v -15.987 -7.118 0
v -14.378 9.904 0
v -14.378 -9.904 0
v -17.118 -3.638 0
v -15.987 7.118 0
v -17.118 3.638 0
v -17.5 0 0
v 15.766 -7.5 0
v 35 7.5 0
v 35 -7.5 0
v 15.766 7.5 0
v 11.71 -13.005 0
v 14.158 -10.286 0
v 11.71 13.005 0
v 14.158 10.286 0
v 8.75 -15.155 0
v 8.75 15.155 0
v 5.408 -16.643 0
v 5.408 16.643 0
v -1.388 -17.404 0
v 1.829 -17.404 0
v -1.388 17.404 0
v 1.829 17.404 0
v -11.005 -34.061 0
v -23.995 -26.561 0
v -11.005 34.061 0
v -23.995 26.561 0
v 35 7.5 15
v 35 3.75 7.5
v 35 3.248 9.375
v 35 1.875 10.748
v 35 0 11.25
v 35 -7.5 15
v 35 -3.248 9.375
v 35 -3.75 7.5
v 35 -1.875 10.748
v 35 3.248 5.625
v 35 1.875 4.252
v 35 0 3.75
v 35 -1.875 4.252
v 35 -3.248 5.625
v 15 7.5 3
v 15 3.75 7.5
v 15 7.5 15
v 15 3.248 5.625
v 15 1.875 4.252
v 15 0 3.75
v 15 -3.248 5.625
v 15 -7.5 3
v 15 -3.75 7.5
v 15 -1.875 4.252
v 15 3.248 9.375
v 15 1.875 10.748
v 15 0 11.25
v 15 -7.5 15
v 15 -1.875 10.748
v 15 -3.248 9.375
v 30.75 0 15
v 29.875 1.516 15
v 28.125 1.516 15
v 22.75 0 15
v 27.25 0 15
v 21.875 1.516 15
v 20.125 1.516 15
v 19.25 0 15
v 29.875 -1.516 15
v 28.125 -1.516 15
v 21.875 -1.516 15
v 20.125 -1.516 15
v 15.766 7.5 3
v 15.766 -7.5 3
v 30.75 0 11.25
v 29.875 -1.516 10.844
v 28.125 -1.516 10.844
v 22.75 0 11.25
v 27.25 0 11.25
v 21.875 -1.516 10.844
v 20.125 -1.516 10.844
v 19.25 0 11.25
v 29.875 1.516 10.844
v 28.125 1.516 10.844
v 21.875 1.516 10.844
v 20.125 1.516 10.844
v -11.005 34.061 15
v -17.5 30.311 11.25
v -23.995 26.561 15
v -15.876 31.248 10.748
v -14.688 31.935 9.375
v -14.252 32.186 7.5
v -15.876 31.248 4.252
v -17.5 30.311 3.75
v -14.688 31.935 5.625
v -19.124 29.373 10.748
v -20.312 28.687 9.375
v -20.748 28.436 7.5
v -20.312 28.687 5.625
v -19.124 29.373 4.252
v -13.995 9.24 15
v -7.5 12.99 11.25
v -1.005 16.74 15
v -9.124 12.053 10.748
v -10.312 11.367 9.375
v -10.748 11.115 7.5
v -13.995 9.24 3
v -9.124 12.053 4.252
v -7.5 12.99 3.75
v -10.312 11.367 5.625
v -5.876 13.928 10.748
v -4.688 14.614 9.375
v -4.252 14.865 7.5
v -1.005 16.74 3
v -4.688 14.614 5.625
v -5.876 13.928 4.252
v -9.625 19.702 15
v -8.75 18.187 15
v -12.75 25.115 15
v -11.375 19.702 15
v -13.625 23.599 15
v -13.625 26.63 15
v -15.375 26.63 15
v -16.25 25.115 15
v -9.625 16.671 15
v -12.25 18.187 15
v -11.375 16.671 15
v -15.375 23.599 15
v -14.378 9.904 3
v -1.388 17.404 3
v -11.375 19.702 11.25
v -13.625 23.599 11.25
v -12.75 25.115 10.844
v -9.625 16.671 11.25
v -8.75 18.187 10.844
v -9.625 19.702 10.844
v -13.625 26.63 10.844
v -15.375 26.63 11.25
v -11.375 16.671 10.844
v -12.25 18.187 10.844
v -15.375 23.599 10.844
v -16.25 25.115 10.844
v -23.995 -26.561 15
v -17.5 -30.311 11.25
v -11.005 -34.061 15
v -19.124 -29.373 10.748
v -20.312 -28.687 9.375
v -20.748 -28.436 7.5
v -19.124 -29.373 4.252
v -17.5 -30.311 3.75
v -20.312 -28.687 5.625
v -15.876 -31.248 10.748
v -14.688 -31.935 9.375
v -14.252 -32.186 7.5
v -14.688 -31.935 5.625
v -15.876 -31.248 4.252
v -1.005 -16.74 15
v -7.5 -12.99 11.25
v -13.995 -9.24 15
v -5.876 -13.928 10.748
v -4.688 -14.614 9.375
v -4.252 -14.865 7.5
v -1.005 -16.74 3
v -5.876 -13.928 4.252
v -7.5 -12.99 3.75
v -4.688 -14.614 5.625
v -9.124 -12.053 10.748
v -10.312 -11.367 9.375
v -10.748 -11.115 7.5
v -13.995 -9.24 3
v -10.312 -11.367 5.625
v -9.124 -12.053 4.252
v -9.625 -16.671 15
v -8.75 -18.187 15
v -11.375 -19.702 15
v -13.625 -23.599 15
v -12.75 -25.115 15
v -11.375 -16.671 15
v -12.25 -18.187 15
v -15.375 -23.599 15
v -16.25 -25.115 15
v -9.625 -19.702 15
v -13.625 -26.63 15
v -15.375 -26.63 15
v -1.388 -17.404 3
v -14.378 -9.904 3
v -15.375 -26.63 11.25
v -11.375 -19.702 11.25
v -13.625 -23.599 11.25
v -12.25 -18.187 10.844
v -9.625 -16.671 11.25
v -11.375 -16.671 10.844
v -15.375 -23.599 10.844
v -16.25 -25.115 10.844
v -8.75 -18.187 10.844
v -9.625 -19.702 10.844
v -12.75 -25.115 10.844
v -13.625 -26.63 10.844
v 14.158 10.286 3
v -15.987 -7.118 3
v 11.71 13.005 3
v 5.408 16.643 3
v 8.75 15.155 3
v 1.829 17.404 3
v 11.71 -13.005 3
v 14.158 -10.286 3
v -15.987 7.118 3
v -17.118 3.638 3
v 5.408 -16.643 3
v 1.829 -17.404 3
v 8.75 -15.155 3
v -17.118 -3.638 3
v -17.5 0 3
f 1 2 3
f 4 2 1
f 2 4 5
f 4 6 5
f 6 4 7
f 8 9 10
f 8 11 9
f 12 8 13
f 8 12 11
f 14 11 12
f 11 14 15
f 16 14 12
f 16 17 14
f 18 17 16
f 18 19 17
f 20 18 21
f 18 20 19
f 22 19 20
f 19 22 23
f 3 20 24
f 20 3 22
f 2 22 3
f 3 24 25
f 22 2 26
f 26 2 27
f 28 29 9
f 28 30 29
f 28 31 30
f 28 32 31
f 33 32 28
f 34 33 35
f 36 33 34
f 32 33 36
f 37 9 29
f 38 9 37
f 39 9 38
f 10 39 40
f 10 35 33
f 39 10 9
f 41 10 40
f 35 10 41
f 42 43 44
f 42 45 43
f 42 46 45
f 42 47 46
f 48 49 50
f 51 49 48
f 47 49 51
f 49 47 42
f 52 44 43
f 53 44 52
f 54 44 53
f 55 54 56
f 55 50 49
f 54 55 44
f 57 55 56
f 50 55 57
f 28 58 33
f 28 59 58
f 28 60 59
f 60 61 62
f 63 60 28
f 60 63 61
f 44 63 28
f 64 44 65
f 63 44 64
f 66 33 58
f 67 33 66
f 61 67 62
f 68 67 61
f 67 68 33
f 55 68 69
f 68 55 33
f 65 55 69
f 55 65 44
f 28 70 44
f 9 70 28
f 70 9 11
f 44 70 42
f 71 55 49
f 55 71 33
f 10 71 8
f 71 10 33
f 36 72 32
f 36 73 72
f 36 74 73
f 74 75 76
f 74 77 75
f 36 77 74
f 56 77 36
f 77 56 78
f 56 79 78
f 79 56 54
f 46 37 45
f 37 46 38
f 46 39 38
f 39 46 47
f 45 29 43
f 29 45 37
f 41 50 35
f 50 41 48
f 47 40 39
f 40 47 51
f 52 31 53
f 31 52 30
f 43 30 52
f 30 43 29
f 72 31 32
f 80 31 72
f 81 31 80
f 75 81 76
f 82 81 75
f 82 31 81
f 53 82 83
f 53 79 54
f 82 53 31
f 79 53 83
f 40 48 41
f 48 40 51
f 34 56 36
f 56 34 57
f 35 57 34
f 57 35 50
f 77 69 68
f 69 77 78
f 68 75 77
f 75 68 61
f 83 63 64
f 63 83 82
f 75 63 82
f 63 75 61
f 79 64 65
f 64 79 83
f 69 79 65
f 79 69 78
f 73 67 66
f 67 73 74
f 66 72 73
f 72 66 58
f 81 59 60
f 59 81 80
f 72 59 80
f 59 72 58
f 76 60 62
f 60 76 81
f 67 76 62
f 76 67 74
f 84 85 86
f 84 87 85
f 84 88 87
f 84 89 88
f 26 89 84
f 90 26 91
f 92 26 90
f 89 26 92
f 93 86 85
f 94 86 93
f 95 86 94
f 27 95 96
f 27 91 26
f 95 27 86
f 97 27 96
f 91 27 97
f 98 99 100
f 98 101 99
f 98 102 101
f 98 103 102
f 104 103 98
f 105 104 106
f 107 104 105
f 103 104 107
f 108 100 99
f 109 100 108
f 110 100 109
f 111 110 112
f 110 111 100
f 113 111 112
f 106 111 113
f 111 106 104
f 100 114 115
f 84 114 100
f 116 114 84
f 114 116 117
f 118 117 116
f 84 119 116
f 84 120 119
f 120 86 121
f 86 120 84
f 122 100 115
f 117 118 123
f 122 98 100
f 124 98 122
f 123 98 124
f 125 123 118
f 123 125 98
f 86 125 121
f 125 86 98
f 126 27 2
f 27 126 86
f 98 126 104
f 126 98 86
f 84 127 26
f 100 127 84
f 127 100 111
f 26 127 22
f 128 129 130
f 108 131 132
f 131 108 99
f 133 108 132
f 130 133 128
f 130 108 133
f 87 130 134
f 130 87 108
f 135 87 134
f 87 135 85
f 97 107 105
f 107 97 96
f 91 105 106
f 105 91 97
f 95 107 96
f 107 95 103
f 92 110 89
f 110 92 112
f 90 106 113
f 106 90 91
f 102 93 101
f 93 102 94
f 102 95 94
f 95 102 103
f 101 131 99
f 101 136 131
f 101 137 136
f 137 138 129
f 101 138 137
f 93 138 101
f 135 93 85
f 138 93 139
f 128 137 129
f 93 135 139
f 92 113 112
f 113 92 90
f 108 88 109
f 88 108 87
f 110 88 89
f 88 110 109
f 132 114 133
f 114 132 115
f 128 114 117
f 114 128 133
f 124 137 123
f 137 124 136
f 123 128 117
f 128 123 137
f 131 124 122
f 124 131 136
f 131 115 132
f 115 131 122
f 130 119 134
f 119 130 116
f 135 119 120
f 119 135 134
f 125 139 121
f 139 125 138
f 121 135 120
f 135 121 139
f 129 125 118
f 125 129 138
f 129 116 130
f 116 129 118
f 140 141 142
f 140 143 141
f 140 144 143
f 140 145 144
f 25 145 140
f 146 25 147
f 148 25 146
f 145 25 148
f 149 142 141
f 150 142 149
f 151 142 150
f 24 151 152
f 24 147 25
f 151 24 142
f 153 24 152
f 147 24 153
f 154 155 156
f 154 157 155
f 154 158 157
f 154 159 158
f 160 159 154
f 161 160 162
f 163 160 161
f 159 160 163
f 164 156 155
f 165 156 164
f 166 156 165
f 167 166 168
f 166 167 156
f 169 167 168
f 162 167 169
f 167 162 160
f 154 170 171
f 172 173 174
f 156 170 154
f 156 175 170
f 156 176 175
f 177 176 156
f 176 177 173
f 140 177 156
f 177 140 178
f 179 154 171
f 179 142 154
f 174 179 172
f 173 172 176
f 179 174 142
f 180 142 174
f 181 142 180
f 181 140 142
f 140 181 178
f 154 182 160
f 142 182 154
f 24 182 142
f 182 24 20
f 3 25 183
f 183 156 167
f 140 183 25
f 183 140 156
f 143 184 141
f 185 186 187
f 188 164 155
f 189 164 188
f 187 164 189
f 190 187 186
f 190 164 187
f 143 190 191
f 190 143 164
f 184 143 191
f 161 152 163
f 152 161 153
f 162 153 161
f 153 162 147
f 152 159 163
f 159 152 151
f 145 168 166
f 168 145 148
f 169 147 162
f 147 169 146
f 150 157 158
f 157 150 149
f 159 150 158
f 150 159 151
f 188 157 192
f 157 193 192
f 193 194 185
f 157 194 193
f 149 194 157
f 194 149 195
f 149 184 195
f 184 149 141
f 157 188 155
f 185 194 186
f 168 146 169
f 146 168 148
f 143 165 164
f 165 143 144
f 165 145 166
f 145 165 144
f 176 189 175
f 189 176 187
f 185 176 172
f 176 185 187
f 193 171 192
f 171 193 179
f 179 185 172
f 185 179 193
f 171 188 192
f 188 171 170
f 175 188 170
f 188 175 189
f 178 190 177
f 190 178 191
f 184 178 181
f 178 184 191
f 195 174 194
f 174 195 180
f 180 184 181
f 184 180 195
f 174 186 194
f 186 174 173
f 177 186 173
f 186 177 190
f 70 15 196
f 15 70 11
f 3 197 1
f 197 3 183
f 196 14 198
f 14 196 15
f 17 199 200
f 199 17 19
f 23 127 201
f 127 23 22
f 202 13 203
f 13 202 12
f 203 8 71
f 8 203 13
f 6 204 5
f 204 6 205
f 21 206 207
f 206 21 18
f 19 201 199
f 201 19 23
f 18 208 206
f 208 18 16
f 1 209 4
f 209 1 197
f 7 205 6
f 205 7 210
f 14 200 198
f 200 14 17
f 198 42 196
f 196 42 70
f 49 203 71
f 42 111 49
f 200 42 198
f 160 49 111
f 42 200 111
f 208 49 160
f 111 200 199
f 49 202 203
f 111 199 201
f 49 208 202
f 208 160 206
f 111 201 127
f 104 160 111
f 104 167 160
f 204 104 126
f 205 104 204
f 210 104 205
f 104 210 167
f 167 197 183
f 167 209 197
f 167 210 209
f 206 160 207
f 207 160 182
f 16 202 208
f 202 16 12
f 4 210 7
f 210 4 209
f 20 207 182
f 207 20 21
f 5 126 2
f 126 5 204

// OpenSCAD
union() {
	cylinder(d = 35, h = 3);
	translate(v = [0, 0, 7.5000000000]) {
		translate(v = [25, 0, 0]) {
			difference() {
				rotate(a = [0, 90, 0]) {
					difference() {
						cube(center = true, size = [15, 15, 20]);
						translate(v = [0, 0, -20]) {
							cylinder(d = 7.5000000000, h = 40);
						}
					}
				}
				translate(v = [-4, 0, 0]) {
					cylinder(d = 3.5000000000, h = 10);
				}
				translate(v = [4, 0, 0]) {
					cylinder(d = 3.5000000000, h = 10);
				}
			}
		}
	}
	rotate(a = [0, 0, 120]) {
		translate(v = [0, 0, 7.5000000000]) {
			translate(v = [25, 0, 0]) {
				difference() {
					rotate(a = [0, 90, 0]) {
						difference() {
							cube(center = true, size = [15, 15, 20]);
							translate(v = [0, 0, -20]) {
								cylinder(d = 7.5000000000, h = 40);
							}
						}
					}
					translate(v = [-4, 0, 0]) {
						cylinder(d = 3.5000000000, h = 10);
					}
					translate(v = [4, 0, 0]) {
						cylinder(d = 3.5000000000, h = 10);
					}
				}
			}
		}
	}
	rotate(a = [0, 0, 240]) {
		translate(v = [0, 0, 7.5000000000]) {
			translate(v = [25, 0, 0]) {
				difference() {
					rotate(a = [0, 90, 0]) {
						difference() {
							cube(center = true, size = [15, 15, 20]);
							translate(v = [0, 0, -20]) {
								cylinder(d = 7.5000000000, h = 40);
							}
						}
					}
					translate(v = [-4, 0, 0]) {
						cylinder(d = 3.5000000000, h = 10);
					}
					translate(v = [4, 0, 0]) {
						cylinder(d = 3.5000000000, h = 10);
					}
				}
			}
		}
	}
}
